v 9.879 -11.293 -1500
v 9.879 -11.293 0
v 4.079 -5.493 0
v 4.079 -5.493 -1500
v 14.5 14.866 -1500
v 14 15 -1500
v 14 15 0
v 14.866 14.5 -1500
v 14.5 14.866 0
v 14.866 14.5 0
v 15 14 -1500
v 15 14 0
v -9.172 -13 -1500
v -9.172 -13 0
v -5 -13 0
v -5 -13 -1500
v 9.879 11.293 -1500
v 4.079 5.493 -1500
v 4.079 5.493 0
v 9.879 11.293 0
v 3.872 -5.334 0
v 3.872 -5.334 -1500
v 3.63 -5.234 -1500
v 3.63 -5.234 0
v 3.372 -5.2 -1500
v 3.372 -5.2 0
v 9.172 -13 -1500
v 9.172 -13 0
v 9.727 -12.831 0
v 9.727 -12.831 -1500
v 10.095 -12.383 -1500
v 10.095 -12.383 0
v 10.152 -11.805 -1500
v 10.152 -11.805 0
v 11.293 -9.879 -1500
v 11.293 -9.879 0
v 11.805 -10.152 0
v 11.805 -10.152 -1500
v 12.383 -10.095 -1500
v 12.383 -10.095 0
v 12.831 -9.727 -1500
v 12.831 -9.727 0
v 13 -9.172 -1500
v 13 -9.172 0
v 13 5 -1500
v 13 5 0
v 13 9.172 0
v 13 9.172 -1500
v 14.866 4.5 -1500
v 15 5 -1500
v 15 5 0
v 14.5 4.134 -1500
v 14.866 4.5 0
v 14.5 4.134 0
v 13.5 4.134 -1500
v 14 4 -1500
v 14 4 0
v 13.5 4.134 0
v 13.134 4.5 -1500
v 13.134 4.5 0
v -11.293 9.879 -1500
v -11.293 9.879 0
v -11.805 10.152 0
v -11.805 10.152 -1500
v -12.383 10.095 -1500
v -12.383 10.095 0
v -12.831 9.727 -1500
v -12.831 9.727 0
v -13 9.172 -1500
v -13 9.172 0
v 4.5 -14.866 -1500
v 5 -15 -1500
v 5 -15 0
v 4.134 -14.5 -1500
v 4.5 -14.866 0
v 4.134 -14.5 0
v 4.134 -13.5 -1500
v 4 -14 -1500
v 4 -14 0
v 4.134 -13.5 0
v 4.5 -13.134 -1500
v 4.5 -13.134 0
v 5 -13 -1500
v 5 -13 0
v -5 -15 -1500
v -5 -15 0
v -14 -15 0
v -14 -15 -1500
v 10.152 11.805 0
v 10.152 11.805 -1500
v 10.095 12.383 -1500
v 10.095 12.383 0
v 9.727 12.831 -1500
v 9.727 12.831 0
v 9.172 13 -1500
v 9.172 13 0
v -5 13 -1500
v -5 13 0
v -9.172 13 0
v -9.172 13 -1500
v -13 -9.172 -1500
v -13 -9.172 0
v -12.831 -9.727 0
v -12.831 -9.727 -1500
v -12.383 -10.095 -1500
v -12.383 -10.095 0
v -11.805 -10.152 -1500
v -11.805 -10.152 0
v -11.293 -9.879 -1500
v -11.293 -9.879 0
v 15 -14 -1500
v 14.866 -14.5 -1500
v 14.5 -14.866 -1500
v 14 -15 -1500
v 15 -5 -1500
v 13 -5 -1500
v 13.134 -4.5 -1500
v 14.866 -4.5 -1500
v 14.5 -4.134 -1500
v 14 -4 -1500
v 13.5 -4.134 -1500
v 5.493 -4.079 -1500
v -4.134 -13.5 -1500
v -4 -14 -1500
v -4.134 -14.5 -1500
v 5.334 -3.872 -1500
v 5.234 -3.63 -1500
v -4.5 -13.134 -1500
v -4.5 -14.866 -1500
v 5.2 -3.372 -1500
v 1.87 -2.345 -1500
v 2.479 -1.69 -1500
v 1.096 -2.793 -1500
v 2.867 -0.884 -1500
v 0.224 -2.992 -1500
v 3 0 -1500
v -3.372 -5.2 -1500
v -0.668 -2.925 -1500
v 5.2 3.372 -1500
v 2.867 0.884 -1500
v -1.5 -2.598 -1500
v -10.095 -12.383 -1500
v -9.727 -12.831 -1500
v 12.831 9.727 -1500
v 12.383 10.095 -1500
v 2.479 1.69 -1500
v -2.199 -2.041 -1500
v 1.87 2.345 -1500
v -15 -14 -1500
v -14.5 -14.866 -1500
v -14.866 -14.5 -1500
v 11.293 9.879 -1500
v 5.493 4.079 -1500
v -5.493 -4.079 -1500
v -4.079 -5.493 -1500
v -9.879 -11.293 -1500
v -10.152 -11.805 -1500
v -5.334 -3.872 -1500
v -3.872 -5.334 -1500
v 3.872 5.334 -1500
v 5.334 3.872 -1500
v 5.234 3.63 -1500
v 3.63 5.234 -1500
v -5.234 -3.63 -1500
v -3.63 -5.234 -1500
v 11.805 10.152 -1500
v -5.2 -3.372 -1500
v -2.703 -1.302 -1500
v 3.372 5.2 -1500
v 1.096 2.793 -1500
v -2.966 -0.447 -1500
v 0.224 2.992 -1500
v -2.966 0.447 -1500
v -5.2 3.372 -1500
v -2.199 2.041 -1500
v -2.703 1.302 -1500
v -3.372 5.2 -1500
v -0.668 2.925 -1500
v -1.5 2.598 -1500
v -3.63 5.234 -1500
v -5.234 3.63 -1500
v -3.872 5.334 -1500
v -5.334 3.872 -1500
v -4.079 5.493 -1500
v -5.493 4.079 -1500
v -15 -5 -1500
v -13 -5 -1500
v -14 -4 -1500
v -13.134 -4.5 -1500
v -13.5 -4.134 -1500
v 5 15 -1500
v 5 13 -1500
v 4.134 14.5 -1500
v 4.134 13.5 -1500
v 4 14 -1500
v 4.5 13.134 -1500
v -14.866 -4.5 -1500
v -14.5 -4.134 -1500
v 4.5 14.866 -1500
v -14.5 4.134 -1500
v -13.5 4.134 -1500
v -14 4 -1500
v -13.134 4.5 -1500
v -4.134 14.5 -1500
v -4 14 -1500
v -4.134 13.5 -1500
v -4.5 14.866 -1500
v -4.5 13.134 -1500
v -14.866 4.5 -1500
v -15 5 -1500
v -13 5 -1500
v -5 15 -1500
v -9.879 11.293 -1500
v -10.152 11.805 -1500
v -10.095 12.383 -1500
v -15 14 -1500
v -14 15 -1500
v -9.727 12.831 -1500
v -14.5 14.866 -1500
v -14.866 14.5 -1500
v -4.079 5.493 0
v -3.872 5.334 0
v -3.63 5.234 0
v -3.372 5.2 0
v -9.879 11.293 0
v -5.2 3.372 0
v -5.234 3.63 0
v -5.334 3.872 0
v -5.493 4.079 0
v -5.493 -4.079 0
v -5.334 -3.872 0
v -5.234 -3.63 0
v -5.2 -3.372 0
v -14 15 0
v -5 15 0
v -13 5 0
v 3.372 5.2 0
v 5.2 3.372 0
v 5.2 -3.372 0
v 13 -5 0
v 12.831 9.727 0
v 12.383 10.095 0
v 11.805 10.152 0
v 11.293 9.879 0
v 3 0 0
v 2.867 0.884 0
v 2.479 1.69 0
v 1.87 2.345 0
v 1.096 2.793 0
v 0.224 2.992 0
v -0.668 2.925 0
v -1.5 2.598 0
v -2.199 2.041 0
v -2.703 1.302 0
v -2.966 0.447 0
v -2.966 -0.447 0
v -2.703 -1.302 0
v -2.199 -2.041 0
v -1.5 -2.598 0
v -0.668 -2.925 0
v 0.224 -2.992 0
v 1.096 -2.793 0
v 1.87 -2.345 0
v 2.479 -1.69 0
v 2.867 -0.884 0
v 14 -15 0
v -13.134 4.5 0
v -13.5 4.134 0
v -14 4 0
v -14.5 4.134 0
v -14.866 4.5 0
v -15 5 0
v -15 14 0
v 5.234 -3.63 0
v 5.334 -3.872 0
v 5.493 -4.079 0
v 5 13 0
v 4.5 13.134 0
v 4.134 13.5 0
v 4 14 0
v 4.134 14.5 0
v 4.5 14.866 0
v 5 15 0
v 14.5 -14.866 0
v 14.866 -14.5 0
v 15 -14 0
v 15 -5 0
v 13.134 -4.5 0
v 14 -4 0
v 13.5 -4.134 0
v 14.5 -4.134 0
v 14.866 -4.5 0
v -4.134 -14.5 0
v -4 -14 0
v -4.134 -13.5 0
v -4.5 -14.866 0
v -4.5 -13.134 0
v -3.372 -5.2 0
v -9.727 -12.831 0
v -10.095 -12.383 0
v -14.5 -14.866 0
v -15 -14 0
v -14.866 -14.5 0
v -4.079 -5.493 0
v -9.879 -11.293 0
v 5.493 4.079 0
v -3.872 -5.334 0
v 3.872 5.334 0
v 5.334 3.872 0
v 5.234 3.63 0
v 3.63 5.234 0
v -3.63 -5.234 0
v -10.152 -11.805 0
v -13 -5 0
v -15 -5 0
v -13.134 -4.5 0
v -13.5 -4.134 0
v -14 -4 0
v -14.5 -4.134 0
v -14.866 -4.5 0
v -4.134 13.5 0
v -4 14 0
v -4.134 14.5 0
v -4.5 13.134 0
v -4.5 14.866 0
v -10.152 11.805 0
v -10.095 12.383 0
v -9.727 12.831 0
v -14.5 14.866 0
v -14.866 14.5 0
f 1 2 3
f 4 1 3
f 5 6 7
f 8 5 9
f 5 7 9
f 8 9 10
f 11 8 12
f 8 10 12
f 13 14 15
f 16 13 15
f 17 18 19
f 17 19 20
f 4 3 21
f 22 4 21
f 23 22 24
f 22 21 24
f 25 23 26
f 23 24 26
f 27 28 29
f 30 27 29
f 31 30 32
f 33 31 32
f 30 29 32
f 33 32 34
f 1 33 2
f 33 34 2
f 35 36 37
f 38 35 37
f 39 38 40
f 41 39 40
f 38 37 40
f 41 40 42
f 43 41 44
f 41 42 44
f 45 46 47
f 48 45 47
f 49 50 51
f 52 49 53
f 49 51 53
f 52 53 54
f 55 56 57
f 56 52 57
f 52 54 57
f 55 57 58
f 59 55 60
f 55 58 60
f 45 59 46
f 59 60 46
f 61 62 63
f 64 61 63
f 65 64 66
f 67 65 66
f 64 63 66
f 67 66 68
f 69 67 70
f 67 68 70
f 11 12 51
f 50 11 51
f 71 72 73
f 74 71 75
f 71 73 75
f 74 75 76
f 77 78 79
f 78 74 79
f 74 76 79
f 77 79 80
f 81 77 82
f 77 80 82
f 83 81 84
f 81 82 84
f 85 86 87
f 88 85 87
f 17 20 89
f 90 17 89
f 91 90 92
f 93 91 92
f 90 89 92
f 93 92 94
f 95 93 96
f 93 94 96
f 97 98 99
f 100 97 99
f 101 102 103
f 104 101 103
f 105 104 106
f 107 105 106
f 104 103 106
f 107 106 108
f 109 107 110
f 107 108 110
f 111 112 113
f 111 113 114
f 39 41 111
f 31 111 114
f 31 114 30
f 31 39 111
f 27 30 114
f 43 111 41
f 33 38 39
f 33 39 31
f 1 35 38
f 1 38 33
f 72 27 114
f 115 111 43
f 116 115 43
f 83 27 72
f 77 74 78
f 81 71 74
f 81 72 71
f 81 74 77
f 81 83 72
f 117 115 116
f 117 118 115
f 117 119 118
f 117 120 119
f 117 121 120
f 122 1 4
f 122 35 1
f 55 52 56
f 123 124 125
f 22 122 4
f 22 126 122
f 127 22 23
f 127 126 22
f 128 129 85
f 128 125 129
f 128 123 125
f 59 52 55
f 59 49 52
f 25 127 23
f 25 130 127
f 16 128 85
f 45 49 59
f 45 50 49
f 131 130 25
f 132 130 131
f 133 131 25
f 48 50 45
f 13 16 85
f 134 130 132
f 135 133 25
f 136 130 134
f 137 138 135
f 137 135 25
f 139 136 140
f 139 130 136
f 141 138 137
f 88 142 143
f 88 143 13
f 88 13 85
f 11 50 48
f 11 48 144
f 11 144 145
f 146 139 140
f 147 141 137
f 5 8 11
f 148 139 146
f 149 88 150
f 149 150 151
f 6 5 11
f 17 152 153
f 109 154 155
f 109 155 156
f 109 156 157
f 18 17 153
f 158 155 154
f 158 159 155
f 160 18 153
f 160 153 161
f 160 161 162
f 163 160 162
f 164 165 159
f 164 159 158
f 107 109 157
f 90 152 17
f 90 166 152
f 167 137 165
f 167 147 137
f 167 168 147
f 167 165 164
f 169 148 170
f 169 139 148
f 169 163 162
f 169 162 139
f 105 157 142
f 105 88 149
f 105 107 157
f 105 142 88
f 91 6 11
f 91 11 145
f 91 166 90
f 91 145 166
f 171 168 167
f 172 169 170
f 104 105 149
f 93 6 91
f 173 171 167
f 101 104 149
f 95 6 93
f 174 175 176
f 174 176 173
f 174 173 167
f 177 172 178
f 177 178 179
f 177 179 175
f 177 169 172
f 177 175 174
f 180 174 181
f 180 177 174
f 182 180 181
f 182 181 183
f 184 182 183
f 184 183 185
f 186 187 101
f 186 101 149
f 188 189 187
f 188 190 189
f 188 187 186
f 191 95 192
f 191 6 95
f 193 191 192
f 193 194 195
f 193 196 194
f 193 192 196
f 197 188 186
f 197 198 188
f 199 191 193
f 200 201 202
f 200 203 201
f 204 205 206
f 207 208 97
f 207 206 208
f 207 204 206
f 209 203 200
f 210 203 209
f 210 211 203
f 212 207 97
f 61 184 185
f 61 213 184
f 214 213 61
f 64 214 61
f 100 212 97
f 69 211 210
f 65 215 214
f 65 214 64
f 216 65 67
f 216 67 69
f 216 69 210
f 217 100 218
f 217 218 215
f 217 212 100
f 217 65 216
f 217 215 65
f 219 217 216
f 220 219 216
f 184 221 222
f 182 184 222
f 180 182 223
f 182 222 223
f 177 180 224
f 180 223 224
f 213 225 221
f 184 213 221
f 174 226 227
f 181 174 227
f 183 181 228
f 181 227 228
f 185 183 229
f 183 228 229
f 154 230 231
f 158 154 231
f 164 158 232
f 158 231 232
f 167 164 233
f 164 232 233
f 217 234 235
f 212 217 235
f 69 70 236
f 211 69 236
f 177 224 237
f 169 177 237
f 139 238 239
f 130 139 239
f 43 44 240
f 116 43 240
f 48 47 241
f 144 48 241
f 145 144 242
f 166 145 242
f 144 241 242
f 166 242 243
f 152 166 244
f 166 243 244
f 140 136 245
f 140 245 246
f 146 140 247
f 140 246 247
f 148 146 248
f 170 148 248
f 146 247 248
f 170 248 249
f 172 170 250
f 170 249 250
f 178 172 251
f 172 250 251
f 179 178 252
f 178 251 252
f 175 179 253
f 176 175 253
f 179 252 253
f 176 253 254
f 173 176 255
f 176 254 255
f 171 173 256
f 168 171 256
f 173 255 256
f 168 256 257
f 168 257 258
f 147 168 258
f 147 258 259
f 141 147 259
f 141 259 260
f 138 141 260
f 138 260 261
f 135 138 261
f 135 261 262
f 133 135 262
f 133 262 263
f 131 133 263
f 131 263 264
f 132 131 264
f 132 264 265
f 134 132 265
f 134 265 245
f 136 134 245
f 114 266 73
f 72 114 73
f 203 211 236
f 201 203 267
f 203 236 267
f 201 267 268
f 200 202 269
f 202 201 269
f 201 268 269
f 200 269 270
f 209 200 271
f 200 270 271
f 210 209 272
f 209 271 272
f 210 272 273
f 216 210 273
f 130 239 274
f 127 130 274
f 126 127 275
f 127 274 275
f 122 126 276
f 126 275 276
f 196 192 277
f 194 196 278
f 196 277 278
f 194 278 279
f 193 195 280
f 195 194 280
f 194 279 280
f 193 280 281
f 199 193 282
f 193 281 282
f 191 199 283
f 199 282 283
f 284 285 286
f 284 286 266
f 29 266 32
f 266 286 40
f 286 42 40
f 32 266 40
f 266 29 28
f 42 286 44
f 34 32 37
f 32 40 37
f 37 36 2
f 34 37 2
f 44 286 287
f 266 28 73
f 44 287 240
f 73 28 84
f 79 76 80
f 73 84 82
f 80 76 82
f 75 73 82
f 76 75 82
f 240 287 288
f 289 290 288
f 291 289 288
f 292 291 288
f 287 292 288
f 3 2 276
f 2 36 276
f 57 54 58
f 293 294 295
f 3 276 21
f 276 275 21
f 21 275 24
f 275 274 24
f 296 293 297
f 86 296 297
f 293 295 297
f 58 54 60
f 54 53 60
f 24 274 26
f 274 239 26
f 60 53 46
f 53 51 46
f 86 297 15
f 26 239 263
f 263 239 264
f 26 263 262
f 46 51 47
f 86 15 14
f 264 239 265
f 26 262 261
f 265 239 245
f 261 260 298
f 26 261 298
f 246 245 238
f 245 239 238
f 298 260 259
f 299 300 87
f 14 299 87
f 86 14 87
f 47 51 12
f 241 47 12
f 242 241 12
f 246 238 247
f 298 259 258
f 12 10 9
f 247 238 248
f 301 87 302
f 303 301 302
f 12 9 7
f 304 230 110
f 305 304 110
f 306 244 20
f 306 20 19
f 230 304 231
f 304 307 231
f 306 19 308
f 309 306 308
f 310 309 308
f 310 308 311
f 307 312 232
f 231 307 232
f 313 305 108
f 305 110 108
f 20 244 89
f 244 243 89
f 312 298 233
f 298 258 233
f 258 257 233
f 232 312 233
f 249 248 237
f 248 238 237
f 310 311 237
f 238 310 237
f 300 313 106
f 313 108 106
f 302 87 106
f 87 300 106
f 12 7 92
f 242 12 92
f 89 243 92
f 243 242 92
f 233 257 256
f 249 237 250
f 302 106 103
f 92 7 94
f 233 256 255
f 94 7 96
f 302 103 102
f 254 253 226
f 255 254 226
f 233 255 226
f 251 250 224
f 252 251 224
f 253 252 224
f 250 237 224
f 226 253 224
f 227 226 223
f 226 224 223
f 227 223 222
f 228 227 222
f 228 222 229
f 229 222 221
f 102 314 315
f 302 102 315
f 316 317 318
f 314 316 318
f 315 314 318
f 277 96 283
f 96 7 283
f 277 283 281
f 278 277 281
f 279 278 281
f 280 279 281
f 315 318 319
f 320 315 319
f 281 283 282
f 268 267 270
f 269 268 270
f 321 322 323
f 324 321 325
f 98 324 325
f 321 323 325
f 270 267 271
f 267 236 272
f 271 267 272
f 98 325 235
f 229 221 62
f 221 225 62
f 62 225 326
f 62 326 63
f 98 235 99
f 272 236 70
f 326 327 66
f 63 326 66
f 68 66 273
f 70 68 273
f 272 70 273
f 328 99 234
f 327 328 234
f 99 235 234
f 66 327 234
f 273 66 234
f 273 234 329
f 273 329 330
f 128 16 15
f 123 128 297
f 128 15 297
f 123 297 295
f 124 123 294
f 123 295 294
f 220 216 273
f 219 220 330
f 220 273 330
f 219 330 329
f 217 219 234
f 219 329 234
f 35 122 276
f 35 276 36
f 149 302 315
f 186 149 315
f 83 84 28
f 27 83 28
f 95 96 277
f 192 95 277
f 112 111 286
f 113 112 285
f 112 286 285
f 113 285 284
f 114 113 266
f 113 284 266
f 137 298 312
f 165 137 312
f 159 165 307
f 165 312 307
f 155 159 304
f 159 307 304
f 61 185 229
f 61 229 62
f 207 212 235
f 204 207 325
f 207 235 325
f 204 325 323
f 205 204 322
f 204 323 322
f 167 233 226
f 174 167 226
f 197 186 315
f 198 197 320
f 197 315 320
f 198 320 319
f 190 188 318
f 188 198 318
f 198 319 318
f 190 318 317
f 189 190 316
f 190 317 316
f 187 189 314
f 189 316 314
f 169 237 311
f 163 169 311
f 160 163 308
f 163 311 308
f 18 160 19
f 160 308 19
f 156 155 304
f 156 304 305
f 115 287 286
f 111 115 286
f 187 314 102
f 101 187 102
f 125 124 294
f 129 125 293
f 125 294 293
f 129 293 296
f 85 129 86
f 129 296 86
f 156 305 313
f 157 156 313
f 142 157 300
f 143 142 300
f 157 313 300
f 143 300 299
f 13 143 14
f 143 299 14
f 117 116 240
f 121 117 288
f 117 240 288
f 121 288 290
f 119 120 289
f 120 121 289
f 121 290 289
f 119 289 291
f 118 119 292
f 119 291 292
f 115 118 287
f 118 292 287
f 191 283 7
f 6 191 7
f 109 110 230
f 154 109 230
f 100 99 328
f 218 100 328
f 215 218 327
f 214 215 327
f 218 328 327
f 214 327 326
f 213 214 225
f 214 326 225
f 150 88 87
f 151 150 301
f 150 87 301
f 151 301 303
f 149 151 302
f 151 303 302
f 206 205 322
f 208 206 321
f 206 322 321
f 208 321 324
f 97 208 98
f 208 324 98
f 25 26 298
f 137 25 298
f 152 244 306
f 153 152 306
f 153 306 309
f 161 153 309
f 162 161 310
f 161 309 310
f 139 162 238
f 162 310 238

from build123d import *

# Parameters (mm, degrees)
SALIENTE_EXTRUIR1_DEPTH = 1500
CROQUIS2_R              = 3
CORTAR_EXTRUIR1_DEPTH   = 1501.149992501
CORTAR_EXTRUIR3_DEPTH   = 1501.149992501


with BuildPart() as part:
    # Croquis1 → Saliente-Extruir1 (new body)
    with BuildSketch(Plane.XY):
        with BuildLine():
            Line((-14, 15), (14, 15))
            ThreePointArc((14, 15), (14.707106781, 14.707106781), (15, 14))
            Line((15, 14), (15, -14))
            ThreePointArc((15, -14), (14.707106781, -14.707106781), (14, -15))
            Line((14, -15), (-14, -15))
            ThreePointArc((-14, -15), (-14.707106781, -14.707106781), (-15, -14))
            Line((-15, -14), (-15, 14))
            ThreePointArc((-15, 14), (-14.707106781, 14.707106781), (-14, 15))
        make_face()
    extrude(amount=-SALIENTE_EXTRUIR1_DEPTH)

    # Croquis2 → Cortar-Extruir1 (cut, through all)
    with BuildSketch(Plane.XY):
        Circle(CROQUIS2_R)
    extrude(amount=-CORTAR_EXTRUIR1_DEPTH, mode=Mode.SUBTRACT)

    # Croquis3 → Cortar-Extruir3 (cut, through all)
    with BuildSketch(Plane.XY):
        with BuildLine():
            Line((-5.492893219, 4.078679656), (-11.292893219, 9.878679656))
            ThreePointArc((-11.292893219, 9.878679656), (-12.382683432, 10.095452408), (-13, 9.171572875))
            Line((-13, 9.171572875), (-13, 5))
            ThreePointArc((-13, 5), (-14, 4), (-15, 5))
            Line((-15, 5), (-15, -5))
            ThreePointArc((-15, -5), (-14, -4), (-13, -5))
            Line((-13, -5), (-13, -9.171572875))
            ThreePointArc((-13, -9.171572875), (-12.382683432, -10.095452408), (-11.292893219, -9.878679656))
            Line((-11.292893219, -9.878679656), (-5.492893219, -4.078679656))
            ThreePointArc((-5.492893219, -4.078679656), (-5.276120467, -3.754256308), (-5.2, -3.371572875))
            Line((-5.2, -3.371572875), (-5.2, 3.371572875))
            ThreePointArc((-5.2, 3.371572875), (-5.276120467, 3.754256308), (-5.492893219, 4.078679656))
        make_face()
        with BuildLine():
            ThreePointArc((-9.171572875, 13), (-10.095452408, 12.382683432), (-9.878679656, 11.292893219))
            Line((-9.878679656, 11.292893219), (-4.078679656, 5.492893219))
            ThreePointArc((-4.078679656, 5.492893219), (-3.754256308, 5.276120467), (-3.371572875, 5.2))
            Line((-3.371572875, 5.2), (3.371572875, 5.2))
            ThreePointArc((3.371572875, 5.2), (3.754256308, 5.276120467), (4.078679656, 5.492893219))
            Line((4.078679656, 5.492893219), (9.878679656, 11.292893219))
            ThreePointArc((9.878679656, 11.292893219), (10.095452408, 12.382683432), (9.171572875, 13))
            Line((9.171572875, 13), (5, 13))
            ThreePointArc((5, 13), (4, 14), (5, 15))
            Line((5, 15), (-5, 15))
            ThreePointArc((-5, 15), (-4.292893219, 14.707106781), (-4, 14))
            ThreePointArc((-4, 14), (-4.292893219, 13.292893219), (-5, 13))
            Line((-5, 13), (-9.171572875, 13))
        make_face()
        with BuildLine():
            Line((9.878679656, -11.292893219), (4.078679656, -5.492893219))
            ThreePointArc((4.078679656, -5.492893219), (3.754256308, -5.276120467), (3.371572875, -5.2))
            Line((3.371572875, -5.2), (-3.371572875, -5.2))
            ThreePointArc((-3.371572875, -5.2), (-3.754256308, -5.276120467), (-4.078679656, -5.492893219))
            Line((-4.078679656, -5.492893219), (-9.878679656, -11.292893219))
            ThreePointArc((-9.878679656, -11.292893219), (-10.095452408, -12.382683432), (-9.171572875, -13))
            Line((-9.171572875, -13), (-5, -13))
            ThreePointArc((-5, -13), (-4.292893219, -13.292893219), (-4, -14))
            ThreePointArc((-4, -14), (-4.292893219, -14.707106781), (-5, -15))
            Line((-5, -15), (5, -15))
            ThreePointArc((5, -15), (4, -14), (5, -13))
            Line((5, -13), (9.171572875, -13))
            ThreePointArc((9.171572875, -13), (10.095452408, -12.382683432), (9.878679656, -11.292893219))
        make_face()
        with BuildLine():
            ThreePointArc((13, 9.171572875), (12.382683432, 10.095452408), (11.292893219, 9.878679656))
            Line((11.292893219, 9.878679656), (5.492893219, 4.078679656))
            ThreePointArc((5.492893219, 4.078679656), (5.276120467, 3.754256308), (5.2, 3.371572875))
            Line((5.2, 3.371572875), (5.2, -3.371572875))
            ThreePointArc((5.2, -3.371572875), (5.276120467, -3.754256308), (5.492893219, -4.078679656))
            Line((5.492893219, -4.078679656), (11.292893219, -9.878679656))
            ThreePointArc((11.292893219, -9.878679656), (12.382683432, -10.095452408), (13, -9.171572875))
            Line((13, -9.171572875), (13, -5))
            ThreePointArc((13, -5), (14, -4), (15, -5))
            Line((15, -5), (15, 5))
            ThreePointArc((15, 5), (14, 4), (13, 5))
            Line((13, 5), (13, 9.171572875))
        make_face()
    extrude(amount=-CORTAR_EXTRUIR3_DEPTH, mode=Mode.SUBTRACT)


solid = part.part
